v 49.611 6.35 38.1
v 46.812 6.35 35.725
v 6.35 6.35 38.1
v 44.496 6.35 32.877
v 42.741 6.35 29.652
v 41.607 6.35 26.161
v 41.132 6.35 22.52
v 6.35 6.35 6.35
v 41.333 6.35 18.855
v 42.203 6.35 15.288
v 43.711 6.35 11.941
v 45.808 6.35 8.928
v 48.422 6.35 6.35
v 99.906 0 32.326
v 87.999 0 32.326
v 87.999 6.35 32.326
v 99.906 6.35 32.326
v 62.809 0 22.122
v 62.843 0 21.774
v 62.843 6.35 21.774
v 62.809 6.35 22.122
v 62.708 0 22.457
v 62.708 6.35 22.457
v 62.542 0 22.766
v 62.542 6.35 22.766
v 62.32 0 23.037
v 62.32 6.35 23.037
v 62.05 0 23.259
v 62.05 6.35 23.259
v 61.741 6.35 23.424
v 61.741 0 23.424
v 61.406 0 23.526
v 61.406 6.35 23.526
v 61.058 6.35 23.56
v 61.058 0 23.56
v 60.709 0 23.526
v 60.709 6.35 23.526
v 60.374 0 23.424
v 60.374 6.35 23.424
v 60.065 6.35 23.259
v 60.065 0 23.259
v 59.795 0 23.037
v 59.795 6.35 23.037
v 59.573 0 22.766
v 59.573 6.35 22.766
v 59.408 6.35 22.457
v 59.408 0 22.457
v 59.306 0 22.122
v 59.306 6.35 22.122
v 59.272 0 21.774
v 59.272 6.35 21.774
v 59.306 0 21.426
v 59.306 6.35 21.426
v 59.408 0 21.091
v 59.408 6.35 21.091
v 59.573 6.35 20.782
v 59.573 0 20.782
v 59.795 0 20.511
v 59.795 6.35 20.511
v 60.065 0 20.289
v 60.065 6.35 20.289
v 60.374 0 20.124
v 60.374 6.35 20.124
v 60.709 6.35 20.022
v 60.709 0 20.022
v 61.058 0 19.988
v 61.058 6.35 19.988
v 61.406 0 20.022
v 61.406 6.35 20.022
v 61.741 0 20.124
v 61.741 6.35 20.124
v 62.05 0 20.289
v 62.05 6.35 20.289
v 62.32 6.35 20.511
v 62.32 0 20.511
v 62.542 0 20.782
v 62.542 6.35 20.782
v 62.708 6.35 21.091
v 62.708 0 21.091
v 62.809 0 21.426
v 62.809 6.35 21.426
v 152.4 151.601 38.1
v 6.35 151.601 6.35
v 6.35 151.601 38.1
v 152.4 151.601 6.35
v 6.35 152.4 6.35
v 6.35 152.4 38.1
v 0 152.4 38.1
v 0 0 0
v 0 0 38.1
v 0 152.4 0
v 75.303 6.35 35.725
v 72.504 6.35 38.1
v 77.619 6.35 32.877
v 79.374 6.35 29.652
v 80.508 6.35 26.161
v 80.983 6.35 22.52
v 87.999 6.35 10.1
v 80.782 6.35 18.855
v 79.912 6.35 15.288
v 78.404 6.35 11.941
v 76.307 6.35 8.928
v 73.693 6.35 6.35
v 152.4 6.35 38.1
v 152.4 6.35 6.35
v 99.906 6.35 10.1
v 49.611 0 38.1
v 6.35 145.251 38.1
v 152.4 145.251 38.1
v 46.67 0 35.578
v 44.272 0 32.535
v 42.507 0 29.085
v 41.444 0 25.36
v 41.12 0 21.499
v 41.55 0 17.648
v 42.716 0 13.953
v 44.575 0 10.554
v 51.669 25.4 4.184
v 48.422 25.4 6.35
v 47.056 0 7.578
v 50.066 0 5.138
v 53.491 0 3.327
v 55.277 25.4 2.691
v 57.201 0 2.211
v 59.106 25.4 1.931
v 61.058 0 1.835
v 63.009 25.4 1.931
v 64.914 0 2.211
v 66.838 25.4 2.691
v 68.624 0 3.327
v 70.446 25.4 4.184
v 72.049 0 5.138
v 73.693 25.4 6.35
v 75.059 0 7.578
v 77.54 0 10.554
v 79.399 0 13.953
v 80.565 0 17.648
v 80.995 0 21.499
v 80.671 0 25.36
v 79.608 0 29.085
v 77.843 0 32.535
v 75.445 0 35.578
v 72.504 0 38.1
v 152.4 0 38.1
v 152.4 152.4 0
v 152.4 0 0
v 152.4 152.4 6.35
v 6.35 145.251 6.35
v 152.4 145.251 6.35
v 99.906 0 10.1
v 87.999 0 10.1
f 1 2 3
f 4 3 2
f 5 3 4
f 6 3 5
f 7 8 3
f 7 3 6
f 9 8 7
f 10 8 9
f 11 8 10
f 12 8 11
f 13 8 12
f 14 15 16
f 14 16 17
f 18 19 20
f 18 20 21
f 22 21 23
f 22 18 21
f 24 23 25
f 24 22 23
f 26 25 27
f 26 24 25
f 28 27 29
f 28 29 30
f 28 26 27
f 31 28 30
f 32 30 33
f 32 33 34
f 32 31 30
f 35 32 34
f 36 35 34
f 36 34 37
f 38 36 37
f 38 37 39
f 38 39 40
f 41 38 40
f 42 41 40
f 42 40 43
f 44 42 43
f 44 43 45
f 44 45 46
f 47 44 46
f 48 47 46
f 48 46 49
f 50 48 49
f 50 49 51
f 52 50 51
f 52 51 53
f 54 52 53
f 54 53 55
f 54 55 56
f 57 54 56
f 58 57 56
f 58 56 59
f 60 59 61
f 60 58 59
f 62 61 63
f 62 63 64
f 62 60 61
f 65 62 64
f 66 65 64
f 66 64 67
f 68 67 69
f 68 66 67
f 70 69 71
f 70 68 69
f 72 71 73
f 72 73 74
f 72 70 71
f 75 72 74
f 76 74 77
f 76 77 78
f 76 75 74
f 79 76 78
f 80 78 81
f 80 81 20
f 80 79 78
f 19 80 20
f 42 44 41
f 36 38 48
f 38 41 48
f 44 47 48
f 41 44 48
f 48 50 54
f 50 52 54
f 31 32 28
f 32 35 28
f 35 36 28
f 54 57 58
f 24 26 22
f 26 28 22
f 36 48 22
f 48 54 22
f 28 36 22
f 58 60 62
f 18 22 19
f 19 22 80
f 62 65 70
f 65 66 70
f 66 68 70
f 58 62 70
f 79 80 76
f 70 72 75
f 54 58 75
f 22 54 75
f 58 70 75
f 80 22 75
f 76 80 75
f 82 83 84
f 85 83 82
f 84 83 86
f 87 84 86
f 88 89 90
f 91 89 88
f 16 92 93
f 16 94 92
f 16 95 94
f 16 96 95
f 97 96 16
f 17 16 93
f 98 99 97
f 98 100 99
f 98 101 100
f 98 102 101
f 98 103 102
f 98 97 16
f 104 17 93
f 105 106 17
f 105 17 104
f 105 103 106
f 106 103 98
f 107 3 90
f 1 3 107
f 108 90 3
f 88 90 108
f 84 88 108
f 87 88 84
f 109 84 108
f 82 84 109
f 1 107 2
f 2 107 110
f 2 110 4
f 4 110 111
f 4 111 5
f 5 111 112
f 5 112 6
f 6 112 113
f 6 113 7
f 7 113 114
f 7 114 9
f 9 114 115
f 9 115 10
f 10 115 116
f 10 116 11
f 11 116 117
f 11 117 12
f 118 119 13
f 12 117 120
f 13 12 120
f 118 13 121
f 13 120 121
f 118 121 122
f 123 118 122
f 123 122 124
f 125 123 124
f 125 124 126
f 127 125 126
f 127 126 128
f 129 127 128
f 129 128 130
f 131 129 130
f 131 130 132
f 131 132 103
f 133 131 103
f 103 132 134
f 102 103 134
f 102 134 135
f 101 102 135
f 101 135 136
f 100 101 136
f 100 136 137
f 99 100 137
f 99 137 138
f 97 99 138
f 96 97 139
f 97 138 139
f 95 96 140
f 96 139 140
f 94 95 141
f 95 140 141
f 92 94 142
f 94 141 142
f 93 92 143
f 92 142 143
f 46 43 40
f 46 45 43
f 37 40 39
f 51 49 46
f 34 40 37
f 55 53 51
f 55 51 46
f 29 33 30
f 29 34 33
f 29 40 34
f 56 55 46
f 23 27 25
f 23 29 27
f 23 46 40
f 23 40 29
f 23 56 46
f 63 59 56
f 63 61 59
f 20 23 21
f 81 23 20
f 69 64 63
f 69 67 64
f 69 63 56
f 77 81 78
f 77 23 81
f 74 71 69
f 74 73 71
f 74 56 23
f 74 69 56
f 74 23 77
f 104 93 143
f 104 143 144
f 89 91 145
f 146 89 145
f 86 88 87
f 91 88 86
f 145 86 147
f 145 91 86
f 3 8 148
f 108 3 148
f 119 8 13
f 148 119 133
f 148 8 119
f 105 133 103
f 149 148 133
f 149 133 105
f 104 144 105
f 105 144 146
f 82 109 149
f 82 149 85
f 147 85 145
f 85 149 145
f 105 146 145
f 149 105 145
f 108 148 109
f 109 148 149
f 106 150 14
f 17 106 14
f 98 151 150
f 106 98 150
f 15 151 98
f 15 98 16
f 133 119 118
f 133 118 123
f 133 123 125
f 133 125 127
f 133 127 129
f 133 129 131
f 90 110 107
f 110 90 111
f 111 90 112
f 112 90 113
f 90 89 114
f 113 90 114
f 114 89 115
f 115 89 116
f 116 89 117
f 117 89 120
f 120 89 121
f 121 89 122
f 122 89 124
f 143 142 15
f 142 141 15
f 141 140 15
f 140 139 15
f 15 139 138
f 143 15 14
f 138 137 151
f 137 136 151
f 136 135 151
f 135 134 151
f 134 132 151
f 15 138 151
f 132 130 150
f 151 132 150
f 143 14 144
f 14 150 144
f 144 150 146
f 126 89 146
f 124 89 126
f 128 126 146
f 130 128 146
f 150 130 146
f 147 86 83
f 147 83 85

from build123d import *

# Parameters (mm, degrees)
F0_W      = 152.4
F0_H      = 152.4
F1_DEPTH  = 6.35
F2_W      = 152.4
F2_H      = 6.35
F3_DEPTH  = 38.1
F4_W      = 152.4
F4_H      = 6.35
F5_DEPTH  = 38.1
F6_W      = 6.35
F6_H      = 152.4
F7_DEPTH  = 38.1
F8_W      = 11.90625
F8_H      = 22.225
F8_R      = 19.939
F8_R_2    = 1.785938
F9_DEPTH  = 25.4
F10_DEPTH = 25.4


with BuildPart() as f1:
    # F0 (on Top) → F1 (new body)
    with BuildSketch(Plane.XY):
        with Locations((76.2, 76.2)):
            Rectangle(F0_W, F0_H)
    extrude(amount=F1_DEPTH)

    # F2 (on Top) → F3 (join)
    with BuildSketch(Plane.XY):
        with Locations((76.2, 3.175)):
            Rectangle(F2_W, F2_H)
    extrude(amount=F3_DEPTH)

    # F4 (on Top) → F5 (join)
    with BuildSketch(Plane.XY):
        with Locations((76.2, 148.426215)):
            Rectangle(F4_W, F4_H)
    extrude(amount=F5_DEPTH)

    # F6 (on Top) → F7 (join)
    with BuildSketch(Plane.XY):
        with Locations((3.175, 76.2)):
            Rectangle(F6_W, F6_H)
    extrude(amount=F7_DEPTH)

    # F8 (on Front) → F9 (cut)
    with BuildSketch(Plane.XZ):
        with Locations((93.952597, 21.213)):
            Rectangle(F8_W, F8_H)
        with Locations((61.057515, 21.773981)):
            Circle(F8_R)
        with Locations((61.057515, 21.773981)):
            Circle(F8_R_2, mode=Mode.SUBTRACT)
    extrude(amount=-F9_DEPTH, mode=Mode.SUBTRACT)

    # F8 (on Front) → F10 (cut)
    with BuildSketch(Plane.XZ):
        with Locations((93.952597, 21.213)):
            Rectangle(F8_W, F8_H)
    extrude(amount=-F10_DEPTH, mode=Mode.SUBTRACT)


solid = f1.part
